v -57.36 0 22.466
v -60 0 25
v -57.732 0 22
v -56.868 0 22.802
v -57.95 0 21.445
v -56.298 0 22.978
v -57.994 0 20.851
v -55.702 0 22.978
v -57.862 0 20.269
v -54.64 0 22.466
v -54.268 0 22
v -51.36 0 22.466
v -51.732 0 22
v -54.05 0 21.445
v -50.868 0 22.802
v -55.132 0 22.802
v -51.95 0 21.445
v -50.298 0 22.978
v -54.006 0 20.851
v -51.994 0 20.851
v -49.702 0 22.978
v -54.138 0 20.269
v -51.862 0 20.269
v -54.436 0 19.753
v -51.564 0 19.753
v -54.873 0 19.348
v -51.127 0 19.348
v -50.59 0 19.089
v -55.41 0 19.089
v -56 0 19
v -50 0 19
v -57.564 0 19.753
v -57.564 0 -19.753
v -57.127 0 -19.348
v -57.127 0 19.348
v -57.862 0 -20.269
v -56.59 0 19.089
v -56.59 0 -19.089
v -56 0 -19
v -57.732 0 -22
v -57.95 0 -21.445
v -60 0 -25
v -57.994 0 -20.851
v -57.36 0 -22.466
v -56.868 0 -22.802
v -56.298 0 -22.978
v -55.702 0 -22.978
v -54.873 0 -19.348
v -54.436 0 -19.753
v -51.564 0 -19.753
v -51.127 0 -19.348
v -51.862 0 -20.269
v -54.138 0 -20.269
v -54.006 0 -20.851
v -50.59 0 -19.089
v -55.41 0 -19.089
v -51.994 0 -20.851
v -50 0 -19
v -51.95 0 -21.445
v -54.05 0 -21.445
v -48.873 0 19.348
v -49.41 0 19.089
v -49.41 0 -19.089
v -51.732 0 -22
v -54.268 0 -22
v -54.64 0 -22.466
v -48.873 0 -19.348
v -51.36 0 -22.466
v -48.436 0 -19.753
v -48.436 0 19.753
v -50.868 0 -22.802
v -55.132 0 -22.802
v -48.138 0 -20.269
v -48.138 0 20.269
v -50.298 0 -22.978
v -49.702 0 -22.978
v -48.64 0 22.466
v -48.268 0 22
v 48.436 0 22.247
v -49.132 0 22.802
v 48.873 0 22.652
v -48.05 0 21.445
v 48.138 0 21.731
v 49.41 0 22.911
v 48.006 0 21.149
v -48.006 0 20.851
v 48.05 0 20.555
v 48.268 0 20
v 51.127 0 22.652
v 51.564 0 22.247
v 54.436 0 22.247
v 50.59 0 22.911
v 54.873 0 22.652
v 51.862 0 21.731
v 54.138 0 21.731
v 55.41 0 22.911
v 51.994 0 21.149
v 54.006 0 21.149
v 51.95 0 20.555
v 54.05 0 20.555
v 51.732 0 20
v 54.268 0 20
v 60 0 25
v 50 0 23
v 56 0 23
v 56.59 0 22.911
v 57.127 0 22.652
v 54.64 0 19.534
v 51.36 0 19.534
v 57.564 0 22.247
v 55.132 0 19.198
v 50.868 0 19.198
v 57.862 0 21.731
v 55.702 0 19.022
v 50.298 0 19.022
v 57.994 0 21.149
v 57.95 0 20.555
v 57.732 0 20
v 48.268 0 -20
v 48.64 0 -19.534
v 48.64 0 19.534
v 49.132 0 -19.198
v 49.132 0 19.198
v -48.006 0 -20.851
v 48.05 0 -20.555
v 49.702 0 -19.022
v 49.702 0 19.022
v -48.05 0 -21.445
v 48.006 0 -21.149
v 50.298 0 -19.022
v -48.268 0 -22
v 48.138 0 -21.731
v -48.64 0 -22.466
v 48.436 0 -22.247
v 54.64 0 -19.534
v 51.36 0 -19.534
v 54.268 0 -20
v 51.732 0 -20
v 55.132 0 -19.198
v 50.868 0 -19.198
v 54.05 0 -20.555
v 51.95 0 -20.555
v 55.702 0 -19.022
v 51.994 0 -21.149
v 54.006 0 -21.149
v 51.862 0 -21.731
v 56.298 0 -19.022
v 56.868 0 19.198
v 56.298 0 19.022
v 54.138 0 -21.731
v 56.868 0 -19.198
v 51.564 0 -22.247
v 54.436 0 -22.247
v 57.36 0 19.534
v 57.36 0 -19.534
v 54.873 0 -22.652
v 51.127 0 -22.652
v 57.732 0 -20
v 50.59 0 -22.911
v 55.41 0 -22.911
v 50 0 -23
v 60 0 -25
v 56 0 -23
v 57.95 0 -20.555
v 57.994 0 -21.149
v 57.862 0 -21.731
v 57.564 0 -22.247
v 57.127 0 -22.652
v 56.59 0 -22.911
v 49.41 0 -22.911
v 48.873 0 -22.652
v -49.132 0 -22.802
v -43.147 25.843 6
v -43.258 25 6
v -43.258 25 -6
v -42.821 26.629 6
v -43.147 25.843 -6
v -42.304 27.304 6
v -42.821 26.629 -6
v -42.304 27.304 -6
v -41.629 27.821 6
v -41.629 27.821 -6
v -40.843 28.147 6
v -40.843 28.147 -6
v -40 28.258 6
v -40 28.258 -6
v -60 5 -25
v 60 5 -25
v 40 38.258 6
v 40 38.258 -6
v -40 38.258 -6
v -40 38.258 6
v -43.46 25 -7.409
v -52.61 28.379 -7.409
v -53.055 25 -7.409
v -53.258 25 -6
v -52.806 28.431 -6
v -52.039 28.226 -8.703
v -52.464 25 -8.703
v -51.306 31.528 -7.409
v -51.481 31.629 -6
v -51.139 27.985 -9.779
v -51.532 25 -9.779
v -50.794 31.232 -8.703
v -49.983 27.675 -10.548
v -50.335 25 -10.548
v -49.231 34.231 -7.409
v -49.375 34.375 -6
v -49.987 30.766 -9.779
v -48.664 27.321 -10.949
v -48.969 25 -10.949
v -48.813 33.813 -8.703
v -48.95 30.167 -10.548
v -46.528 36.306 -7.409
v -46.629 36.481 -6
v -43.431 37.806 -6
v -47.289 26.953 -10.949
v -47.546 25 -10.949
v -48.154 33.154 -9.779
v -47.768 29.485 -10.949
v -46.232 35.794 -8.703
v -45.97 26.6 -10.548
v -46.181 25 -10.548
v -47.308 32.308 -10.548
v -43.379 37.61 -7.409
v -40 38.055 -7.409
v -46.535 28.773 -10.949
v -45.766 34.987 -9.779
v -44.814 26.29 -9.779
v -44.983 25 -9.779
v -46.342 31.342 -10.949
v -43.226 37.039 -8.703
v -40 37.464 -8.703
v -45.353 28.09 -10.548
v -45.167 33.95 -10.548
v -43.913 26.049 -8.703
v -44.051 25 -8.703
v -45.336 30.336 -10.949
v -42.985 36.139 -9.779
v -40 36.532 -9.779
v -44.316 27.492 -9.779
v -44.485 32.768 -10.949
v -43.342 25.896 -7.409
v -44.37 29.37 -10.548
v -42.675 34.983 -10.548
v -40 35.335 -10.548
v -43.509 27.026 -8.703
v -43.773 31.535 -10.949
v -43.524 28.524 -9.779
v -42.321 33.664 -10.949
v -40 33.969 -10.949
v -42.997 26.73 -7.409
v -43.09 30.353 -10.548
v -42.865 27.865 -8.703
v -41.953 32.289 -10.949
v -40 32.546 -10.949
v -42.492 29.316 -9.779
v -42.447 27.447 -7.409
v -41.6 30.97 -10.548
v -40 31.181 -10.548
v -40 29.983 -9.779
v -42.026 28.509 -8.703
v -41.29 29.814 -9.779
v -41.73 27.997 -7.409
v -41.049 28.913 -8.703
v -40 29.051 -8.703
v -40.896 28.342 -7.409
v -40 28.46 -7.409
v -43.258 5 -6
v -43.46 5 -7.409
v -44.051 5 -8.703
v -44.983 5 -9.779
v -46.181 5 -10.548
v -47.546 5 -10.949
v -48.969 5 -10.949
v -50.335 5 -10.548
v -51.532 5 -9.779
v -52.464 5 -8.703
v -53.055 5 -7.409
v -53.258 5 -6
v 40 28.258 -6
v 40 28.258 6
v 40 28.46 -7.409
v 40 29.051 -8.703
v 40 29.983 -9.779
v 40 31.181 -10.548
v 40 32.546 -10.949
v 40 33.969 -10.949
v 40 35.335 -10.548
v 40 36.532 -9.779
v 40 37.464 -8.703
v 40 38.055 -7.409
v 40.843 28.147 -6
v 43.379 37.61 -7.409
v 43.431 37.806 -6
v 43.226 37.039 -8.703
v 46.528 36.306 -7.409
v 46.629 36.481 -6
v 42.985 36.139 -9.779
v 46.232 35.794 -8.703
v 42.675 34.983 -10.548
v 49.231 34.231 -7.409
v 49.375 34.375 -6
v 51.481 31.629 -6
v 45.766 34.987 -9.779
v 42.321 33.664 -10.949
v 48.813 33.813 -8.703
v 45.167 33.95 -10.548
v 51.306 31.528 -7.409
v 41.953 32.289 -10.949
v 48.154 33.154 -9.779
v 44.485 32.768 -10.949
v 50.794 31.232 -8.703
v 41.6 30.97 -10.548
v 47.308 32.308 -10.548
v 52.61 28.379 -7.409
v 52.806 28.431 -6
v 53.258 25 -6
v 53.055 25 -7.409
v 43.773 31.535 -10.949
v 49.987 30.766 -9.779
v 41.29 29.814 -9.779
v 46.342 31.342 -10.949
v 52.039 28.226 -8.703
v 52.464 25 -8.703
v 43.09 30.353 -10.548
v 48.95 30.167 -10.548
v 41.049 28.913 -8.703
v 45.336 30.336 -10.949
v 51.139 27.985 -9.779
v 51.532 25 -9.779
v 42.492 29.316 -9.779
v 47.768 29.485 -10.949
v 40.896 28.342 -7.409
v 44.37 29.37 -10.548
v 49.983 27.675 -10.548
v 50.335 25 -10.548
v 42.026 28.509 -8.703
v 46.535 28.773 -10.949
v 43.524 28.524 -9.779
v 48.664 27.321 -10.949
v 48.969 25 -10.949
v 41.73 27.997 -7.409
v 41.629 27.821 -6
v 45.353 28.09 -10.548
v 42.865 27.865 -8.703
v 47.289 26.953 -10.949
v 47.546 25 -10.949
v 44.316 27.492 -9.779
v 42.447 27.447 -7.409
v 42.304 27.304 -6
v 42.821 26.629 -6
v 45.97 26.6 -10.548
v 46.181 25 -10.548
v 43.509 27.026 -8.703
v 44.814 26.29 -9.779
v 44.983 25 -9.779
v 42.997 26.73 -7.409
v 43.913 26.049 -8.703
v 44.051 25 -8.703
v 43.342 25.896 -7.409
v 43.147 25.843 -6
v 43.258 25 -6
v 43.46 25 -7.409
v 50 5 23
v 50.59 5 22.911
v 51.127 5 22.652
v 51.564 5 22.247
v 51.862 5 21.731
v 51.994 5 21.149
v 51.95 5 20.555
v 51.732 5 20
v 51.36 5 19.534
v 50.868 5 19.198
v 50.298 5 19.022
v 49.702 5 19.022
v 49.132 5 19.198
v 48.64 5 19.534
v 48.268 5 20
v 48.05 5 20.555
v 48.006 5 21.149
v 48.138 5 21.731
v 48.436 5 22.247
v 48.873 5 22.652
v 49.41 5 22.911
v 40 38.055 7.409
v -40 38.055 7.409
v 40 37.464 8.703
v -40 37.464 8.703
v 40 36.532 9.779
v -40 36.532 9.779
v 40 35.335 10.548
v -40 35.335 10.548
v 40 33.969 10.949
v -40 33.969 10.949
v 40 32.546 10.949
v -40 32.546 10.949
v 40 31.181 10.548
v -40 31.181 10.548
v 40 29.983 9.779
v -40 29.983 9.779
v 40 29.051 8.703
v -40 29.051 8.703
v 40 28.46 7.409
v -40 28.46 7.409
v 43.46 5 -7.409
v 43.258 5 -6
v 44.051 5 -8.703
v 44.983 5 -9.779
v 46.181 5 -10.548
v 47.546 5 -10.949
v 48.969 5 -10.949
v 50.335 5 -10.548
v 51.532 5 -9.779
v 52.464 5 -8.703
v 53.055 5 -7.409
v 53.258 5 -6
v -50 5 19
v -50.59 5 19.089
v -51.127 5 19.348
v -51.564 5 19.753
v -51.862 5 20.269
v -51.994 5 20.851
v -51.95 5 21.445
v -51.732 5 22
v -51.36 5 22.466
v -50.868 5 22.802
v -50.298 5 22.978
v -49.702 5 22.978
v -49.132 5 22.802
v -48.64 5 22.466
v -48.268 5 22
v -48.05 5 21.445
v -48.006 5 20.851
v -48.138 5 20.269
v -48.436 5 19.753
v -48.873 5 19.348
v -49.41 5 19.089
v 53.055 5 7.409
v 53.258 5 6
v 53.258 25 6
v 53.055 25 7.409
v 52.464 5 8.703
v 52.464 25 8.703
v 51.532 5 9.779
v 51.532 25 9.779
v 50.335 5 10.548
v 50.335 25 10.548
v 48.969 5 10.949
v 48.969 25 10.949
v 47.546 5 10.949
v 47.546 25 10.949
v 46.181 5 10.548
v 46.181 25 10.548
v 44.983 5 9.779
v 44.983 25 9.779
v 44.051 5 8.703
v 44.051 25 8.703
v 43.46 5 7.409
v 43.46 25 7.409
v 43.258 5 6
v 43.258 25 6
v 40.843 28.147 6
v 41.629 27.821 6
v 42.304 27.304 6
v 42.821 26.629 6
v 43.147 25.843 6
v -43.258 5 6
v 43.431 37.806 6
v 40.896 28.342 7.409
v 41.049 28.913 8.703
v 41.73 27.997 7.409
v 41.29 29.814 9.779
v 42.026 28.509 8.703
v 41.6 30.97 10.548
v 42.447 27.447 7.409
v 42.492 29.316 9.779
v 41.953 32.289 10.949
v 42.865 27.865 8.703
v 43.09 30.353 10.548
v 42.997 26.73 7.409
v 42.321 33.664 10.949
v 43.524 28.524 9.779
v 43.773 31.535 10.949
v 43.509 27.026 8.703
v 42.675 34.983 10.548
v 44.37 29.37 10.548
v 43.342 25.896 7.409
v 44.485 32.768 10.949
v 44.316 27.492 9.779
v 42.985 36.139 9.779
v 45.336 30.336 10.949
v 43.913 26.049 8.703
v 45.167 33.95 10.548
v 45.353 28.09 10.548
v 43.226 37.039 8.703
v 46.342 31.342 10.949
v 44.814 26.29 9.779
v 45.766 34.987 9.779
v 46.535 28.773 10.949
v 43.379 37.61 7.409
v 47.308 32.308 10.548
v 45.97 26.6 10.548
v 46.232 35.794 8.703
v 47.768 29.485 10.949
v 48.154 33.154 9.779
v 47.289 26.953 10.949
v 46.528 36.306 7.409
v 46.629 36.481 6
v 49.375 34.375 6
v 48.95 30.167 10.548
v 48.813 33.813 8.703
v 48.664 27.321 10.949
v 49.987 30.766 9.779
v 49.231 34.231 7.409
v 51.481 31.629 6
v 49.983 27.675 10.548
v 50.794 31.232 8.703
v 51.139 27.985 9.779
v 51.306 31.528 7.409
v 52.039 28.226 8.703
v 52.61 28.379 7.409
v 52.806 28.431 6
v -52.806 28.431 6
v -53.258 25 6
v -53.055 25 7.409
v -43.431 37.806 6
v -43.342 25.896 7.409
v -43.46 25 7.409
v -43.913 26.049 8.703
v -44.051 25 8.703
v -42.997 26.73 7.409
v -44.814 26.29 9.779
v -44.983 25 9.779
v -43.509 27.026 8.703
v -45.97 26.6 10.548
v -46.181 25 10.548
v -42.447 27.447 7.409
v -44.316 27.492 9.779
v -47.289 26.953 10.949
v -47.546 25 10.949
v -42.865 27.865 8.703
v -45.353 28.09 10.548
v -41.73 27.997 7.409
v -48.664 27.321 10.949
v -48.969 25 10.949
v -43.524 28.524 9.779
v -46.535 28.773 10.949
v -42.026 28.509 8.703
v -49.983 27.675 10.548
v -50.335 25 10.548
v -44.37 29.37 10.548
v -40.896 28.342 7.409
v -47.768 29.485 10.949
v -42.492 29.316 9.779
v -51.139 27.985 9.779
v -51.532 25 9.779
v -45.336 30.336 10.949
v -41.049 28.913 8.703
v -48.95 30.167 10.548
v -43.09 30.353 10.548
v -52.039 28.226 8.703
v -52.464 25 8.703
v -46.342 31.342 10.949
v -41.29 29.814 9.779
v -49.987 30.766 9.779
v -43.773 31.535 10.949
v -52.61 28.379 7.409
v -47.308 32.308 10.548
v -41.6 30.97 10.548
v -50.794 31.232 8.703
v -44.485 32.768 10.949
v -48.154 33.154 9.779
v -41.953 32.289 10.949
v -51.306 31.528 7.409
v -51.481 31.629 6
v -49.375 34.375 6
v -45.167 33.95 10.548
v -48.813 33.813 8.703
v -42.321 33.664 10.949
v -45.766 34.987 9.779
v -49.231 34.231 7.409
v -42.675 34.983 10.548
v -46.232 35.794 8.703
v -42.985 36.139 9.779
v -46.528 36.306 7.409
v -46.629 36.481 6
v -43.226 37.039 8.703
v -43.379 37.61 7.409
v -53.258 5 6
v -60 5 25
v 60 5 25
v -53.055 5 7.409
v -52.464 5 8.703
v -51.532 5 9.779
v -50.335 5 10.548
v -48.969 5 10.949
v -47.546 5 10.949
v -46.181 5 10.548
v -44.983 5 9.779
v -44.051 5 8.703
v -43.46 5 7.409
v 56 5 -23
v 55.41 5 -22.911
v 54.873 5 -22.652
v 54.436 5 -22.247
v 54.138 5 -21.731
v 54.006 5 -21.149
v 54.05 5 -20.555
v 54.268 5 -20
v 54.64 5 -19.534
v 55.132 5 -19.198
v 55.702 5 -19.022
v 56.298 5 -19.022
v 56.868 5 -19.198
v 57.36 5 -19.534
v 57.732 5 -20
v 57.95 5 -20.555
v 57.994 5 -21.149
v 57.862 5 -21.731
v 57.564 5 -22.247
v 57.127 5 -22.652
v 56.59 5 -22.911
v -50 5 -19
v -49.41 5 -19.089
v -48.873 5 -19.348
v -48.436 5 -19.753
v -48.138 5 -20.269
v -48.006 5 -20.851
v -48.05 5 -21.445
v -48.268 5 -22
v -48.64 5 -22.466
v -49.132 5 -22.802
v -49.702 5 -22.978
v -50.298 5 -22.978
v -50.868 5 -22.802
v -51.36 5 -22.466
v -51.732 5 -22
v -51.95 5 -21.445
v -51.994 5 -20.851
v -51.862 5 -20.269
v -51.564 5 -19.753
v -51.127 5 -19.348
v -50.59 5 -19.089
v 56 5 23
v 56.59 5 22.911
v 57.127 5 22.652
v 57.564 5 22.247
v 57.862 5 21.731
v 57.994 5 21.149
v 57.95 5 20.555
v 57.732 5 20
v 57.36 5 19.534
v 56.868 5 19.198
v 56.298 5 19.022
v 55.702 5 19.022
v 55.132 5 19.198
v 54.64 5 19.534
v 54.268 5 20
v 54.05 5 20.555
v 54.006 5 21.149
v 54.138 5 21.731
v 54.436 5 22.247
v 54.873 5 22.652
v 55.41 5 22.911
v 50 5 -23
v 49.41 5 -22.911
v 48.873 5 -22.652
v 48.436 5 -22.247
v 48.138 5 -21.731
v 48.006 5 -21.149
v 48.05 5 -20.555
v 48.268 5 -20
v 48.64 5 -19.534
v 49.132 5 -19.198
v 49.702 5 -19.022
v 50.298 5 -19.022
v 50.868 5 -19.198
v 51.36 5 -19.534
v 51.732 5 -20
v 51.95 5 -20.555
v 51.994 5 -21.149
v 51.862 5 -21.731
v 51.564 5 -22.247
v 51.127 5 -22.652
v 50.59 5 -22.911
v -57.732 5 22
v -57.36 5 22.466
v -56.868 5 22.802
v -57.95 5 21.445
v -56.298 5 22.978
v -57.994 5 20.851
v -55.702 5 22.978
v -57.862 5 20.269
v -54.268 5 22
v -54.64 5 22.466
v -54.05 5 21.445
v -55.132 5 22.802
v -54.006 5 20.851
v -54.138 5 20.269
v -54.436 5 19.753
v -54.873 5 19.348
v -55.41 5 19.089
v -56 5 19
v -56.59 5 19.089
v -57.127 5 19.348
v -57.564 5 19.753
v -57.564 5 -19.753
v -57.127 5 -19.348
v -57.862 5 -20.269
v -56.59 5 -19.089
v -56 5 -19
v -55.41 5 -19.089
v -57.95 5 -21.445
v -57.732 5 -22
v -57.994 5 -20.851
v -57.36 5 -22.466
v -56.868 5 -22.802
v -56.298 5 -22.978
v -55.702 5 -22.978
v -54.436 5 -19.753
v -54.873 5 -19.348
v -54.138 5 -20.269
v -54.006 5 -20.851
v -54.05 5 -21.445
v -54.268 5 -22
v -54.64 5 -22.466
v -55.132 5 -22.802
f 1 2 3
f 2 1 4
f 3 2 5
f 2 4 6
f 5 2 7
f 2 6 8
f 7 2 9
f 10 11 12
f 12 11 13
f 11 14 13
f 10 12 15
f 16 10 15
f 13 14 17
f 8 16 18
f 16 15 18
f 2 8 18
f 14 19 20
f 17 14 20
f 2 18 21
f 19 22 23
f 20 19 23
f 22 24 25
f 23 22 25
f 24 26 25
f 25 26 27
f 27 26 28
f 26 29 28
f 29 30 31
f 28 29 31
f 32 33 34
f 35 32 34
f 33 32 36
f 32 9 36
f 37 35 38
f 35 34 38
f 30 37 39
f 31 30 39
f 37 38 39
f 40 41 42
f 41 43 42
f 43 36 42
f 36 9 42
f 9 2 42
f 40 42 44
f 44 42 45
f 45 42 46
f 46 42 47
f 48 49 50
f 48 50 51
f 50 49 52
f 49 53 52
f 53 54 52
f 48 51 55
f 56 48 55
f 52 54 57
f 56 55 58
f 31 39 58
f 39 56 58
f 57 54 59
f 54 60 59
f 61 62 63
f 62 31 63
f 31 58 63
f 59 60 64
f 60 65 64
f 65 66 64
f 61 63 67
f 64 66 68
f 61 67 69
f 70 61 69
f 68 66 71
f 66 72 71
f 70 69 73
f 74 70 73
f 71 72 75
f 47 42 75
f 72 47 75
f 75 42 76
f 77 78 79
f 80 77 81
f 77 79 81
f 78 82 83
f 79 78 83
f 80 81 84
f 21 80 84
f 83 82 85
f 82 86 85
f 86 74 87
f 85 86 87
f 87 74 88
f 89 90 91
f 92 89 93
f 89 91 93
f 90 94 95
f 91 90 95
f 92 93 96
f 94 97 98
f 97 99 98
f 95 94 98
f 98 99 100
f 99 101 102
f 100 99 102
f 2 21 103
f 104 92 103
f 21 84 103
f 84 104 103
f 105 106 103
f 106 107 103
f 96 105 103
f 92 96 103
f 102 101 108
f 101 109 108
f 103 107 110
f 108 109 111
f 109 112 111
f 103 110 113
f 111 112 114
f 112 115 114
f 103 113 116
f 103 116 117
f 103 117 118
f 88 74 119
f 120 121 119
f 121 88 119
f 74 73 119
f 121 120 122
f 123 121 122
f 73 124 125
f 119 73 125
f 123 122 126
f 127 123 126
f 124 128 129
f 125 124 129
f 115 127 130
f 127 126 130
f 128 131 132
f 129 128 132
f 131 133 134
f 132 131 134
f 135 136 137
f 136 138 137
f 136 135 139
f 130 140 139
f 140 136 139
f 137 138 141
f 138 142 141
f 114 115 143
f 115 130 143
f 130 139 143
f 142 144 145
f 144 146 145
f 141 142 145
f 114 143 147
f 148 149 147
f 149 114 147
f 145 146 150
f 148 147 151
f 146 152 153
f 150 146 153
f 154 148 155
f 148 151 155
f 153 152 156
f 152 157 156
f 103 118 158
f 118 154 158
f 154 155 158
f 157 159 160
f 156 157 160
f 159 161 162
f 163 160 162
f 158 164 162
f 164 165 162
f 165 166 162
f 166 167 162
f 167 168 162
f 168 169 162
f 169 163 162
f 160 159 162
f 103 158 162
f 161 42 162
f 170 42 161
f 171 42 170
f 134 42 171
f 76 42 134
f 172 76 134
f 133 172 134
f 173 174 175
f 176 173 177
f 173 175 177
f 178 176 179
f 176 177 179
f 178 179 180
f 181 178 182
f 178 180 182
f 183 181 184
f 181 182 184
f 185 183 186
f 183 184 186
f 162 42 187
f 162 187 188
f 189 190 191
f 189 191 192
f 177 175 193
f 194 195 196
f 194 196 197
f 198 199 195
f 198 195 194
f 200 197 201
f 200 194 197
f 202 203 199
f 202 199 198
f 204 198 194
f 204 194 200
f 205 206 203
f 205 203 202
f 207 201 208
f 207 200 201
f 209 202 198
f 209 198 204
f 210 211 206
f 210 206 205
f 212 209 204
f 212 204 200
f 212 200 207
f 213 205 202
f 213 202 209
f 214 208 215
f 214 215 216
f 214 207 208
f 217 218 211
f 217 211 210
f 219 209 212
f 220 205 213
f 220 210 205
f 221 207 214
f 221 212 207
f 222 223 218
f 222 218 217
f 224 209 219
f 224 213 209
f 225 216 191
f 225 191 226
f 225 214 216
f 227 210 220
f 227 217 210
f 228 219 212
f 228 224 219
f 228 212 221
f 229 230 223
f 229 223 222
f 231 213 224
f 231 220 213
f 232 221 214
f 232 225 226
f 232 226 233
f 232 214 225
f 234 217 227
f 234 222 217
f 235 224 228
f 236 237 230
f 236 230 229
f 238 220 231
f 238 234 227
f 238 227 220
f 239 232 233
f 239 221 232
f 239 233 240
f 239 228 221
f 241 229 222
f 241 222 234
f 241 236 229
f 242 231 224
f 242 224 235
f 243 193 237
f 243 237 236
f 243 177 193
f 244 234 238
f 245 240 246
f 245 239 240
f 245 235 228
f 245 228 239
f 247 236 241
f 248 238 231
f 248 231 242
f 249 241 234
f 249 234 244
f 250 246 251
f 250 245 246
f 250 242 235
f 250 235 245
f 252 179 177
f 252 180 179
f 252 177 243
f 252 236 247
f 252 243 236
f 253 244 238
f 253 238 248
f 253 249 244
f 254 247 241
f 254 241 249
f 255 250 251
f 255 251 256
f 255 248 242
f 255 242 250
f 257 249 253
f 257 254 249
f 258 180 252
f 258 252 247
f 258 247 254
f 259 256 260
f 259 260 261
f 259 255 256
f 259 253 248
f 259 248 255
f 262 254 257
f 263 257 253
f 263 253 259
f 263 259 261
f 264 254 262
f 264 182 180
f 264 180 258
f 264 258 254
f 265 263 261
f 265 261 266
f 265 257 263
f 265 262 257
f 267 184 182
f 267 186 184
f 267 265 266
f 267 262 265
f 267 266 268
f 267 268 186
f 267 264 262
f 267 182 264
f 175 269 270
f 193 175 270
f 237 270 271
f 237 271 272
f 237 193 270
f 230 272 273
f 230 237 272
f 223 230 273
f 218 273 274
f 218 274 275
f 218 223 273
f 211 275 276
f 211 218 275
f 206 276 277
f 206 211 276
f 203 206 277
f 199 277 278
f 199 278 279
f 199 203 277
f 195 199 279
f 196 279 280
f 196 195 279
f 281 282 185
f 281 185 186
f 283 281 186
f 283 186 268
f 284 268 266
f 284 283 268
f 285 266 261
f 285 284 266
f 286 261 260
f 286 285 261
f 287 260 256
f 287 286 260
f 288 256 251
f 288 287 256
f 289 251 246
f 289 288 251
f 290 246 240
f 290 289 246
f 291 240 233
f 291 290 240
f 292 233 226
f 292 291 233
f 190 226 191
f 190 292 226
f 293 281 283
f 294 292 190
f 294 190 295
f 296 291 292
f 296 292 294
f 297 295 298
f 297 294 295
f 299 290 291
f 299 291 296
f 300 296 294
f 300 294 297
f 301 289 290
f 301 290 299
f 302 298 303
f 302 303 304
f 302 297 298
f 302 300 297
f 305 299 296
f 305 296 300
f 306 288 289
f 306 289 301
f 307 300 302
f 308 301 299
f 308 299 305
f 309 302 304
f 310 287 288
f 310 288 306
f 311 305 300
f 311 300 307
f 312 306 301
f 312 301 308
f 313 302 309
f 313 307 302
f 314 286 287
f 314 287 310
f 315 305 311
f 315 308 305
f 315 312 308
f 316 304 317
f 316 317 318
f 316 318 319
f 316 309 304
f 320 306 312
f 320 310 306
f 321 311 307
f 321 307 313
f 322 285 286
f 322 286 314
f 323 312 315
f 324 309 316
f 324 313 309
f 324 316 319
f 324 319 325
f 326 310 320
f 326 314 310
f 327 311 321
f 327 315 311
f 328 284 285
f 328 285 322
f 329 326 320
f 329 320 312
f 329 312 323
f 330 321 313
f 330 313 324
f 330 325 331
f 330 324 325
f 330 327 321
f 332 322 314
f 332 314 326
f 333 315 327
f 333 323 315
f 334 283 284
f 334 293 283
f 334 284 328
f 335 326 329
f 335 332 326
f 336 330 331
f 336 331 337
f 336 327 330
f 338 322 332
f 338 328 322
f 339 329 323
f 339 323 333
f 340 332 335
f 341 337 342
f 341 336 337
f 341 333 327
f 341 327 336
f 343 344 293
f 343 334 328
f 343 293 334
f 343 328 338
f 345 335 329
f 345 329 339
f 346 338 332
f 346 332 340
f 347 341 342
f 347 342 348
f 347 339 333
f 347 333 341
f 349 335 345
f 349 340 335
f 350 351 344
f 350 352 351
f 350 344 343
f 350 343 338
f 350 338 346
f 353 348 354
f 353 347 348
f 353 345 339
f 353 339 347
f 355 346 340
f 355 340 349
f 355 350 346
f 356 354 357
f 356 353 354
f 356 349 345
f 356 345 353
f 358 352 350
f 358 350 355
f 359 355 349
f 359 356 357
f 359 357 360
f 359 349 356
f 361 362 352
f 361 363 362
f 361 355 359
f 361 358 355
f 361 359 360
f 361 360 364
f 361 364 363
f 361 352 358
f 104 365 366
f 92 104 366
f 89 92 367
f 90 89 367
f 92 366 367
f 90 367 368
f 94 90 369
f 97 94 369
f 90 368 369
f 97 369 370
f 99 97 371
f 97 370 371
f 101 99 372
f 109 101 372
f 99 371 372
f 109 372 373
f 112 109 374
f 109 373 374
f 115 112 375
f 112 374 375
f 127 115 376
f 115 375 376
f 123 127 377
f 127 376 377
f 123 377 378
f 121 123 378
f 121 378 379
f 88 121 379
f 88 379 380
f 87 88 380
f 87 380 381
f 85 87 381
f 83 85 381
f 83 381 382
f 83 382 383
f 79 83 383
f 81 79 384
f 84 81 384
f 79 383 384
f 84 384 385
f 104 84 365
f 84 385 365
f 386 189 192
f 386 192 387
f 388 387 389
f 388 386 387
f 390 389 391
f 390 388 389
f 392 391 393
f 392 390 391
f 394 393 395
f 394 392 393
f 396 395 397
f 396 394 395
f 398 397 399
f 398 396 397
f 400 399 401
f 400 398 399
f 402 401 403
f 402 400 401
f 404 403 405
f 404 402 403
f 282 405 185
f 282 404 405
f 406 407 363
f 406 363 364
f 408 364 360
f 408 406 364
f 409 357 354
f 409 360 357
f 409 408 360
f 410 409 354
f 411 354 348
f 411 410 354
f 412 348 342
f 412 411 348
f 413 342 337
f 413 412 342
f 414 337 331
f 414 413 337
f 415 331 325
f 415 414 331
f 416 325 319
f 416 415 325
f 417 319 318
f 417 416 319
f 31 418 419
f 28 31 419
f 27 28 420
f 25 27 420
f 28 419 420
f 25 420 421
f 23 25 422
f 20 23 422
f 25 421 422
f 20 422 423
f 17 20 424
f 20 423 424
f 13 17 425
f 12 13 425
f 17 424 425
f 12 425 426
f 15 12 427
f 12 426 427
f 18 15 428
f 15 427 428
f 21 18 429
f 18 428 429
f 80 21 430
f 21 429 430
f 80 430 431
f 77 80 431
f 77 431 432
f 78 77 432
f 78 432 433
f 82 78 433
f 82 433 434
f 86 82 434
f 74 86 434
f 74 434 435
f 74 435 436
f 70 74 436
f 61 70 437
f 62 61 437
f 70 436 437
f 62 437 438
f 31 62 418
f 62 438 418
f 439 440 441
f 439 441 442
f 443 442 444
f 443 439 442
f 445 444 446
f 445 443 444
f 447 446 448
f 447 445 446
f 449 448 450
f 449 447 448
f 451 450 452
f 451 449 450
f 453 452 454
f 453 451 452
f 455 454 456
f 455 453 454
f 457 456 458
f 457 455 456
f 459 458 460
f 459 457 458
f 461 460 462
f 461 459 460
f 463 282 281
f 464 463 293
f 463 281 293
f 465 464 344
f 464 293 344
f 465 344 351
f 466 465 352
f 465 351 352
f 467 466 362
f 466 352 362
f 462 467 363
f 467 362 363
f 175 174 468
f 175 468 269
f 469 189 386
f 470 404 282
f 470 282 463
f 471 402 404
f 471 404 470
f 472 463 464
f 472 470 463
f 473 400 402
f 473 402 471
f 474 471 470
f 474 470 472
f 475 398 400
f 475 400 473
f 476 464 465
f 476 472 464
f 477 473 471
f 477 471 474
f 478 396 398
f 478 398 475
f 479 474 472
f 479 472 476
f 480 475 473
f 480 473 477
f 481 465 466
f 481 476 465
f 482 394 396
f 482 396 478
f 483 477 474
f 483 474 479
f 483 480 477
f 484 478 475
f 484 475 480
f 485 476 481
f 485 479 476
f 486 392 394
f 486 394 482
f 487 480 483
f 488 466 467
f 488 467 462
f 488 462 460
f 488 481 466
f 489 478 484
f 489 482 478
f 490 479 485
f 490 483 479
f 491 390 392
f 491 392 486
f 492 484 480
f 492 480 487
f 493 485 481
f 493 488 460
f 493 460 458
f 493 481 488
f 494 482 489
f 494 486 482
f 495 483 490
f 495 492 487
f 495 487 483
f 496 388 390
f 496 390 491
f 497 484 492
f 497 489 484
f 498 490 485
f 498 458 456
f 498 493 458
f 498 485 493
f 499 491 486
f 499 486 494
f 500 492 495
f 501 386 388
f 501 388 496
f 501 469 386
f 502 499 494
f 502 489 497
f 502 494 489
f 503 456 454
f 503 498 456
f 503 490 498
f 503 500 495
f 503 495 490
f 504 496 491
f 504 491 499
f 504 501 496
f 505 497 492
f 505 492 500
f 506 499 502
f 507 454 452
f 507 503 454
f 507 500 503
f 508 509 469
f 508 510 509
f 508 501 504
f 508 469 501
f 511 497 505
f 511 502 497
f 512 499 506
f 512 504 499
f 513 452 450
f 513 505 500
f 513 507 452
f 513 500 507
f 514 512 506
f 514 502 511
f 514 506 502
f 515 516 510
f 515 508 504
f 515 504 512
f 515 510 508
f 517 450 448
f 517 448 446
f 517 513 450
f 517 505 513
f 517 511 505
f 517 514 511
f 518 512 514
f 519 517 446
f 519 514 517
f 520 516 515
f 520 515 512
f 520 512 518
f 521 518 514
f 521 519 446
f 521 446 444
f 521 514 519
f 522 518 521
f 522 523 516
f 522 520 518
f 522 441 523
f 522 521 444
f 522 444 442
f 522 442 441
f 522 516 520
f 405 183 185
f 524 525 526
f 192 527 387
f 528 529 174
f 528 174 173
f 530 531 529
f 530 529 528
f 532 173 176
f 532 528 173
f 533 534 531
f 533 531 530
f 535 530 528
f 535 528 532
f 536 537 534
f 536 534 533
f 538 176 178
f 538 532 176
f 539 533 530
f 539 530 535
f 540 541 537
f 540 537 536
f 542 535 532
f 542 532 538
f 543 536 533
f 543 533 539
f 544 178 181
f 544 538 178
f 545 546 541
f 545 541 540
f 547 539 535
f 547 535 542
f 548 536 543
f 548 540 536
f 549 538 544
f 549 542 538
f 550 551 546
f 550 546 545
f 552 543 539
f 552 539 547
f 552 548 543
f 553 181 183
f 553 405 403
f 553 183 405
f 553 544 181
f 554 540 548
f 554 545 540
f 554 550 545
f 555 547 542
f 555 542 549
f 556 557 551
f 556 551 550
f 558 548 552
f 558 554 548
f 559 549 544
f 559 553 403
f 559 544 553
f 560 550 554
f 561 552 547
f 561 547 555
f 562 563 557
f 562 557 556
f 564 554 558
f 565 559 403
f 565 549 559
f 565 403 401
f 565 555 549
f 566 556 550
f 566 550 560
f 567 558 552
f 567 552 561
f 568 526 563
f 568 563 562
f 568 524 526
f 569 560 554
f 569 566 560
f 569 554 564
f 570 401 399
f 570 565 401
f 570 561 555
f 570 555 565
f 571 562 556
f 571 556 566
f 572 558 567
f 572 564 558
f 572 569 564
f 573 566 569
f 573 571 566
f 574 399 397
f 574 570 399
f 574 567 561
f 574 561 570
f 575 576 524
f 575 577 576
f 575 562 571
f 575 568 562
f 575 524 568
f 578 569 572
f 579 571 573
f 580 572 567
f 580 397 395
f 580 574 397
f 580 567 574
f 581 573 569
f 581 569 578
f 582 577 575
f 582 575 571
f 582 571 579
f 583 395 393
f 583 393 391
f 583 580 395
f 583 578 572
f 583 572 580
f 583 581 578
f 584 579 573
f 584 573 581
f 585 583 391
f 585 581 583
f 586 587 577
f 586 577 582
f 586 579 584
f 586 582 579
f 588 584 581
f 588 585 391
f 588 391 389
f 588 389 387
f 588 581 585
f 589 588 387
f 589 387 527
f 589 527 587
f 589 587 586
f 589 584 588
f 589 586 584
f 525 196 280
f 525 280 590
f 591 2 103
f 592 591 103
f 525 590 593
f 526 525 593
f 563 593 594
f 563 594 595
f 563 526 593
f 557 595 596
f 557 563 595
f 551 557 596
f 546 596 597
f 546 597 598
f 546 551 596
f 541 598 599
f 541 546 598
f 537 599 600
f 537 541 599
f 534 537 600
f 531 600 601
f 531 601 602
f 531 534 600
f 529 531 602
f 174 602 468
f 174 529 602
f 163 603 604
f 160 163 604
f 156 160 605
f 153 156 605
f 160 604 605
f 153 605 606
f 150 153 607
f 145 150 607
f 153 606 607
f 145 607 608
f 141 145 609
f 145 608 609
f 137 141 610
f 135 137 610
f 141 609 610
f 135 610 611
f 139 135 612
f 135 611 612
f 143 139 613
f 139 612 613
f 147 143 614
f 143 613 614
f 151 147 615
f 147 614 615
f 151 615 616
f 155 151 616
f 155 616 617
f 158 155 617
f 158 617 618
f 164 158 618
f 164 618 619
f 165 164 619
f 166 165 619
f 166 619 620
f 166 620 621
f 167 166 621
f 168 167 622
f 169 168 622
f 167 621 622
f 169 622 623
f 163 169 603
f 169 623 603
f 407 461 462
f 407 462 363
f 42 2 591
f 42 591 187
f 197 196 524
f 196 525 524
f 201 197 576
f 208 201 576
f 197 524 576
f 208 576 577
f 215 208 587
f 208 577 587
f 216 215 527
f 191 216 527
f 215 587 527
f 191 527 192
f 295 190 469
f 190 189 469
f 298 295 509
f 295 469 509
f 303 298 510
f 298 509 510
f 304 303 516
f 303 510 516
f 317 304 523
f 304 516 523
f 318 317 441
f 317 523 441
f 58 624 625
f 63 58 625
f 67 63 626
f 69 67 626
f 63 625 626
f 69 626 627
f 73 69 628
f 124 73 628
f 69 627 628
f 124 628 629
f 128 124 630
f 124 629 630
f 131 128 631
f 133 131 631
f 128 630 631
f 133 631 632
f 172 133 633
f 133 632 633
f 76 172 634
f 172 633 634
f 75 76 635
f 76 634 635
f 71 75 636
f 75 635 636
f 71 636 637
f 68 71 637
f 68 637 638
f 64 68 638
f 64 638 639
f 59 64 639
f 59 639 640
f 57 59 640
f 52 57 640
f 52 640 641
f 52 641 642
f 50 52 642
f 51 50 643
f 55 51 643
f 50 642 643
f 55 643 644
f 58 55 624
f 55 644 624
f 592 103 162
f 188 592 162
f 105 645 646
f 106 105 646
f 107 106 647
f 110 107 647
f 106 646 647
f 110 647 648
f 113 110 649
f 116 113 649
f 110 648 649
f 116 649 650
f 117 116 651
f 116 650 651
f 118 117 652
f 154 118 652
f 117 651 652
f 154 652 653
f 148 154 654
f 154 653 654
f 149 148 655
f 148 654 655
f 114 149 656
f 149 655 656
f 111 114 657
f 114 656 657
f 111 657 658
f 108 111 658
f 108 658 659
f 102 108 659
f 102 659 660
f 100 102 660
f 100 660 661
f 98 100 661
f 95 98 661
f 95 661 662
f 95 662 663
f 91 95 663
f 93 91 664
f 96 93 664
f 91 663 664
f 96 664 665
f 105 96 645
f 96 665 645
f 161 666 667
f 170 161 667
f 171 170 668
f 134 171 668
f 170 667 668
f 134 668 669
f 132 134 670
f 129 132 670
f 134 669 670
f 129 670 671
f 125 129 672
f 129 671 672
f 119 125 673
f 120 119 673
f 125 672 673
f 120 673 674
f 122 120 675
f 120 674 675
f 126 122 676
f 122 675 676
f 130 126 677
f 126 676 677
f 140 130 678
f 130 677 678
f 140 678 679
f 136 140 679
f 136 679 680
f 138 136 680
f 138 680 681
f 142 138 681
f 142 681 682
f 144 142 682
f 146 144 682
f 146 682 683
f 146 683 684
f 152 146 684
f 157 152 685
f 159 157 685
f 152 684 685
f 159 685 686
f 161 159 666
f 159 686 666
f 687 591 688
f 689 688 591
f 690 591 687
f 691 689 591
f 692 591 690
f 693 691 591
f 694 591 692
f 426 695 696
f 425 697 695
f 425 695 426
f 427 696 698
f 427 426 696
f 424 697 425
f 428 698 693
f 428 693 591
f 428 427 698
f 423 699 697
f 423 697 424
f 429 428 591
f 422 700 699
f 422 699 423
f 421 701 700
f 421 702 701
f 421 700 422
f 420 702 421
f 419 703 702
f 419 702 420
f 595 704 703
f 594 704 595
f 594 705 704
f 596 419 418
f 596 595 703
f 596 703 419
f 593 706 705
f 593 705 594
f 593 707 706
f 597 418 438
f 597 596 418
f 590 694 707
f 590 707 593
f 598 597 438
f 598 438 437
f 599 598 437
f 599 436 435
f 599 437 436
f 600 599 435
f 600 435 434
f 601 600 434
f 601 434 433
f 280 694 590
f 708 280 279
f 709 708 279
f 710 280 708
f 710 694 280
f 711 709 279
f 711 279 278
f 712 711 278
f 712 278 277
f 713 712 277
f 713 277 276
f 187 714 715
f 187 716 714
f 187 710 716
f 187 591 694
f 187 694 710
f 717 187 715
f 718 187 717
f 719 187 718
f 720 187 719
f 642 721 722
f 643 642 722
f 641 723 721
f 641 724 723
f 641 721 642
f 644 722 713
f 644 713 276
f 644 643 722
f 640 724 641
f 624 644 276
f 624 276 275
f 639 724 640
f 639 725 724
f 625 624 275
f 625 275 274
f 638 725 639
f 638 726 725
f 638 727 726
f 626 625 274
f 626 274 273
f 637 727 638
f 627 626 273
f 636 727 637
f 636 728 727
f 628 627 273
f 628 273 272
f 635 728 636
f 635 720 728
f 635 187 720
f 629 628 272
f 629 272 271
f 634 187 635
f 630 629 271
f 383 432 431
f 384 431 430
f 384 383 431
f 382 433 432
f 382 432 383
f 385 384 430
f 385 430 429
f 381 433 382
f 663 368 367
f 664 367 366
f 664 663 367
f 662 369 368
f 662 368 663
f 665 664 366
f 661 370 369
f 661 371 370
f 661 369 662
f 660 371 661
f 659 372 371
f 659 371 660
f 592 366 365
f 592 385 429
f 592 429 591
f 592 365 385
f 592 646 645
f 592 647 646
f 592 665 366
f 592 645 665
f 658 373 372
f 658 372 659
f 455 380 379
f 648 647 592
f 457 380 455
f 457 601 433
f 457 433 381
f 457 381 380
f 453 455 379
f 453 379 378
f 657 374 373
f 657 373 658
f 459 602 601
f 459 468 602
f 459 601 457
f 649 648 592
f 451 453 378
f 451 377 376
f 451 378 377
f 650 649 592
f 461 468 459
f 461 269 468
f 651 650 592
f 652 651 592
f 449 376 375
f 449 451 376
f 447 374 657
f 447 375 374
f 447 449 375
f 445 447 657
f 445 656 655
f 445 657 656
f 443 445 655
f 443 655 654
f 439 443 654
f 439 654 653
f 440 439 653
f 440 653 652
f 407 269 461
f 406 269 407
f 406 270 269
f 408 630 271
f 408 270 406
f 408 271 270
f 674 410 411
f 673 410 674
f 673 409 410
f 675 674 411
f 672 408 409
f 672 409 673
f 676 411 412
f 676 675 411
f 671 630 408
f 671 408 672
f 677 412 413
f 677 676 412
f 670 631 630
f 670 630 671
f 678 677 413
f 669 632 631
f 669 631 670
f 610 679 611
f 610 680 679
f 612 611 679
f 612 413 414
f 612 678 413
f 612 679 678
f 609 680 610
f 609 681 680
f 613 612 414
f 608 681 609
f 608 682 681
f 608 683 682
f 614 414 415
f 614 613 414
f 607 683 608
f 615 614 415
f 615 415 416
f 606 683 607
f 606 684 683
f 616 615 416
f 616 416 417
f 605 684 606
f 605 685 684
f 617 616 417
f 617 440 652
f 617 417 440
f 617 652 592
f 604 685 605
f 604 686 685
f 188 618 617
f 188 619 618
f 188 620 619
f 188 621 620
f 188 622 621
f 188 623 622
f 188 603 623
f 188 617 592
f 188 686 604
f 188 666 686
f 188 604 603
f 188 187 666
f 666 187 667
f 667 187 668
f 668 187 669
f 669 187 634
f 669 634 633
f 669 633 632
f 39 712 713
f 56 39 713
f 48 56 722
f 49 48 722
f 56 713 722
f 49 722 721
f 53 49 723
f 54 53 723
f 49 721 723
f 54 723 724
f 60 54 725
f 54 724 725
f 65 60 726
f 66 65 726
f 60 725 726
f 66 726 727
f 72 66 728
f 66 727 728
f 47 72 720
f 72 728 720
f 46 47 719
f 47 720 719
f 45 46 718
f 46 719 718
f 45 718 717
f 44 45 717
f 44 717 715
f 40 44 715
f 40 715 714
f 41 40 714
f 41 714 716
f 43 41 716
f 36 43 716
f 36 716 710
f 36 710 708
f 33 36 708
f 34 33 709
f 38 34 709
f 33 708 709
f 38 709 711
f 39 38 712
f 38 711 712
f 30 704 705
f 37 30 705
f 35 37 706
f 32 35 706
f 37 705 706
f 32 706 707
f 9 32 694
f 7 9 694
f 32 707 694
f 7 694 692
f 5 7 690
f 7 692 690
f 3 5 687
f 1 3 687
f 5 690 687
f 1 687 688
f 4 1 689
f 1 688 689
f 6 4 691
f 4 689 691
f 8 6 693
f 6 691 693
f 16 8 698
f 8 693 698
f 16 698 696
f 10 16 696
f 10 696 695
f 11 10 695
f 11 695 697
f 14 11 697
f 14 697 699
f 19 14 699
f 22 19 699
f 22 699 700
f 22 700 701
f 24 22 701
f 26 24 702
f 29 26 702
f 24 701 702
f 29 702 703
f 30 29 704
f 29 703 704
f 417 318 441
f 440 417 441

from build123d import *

# Parameters (mm, degrees)
SKETCH3_W           = 120
SKETCH3_H           = 50
BOSS_EXTRUDE1_DEPTH = 5
SKETCH6_R           = 2
CUT_EXTRUDE1_DEPTH  = 5


with BuildPart() as part:
    # Sketch3 → Boss-Extrude1 (new body)
    with BuildSketch(Plane(origin=(0, 0, 0), x_dir=(1, 0, 0), z_dir=(0, 1, 0))):
        Rectangle(SKETCH3_W, SKETCH3_H)
    extrude(amount=BOSS_EXTRUDE1_DEPTH)

    # Sweep1: sweep along a path in Sketch4
    with BuildLine(Plane.XY) as sweep1_path:
        Line((-50, 5), (-50, 25))
        ThreePointArc((-50, 25), (-47.071067812, 32.071067812), (-40, 35))
        Line((-40, 35), (40, 35))
        ThreePointArc((40, 35), (47.071067812, 32.071067812), (50, 25))
        Line((50, 25), (50, 5))
    # Sketch5 → Sweep1 (sweep)
    with BuildSketch(Plane(origin=(0, 5, 0), x_dir=(1, 0, 0), z_dir=(0, 1, 0))):
        with BuildLine():
            Line((-43.257688432, 6), (-43.257688432, -6))
            ThreePointArc((-43.257688432, -6), (-48.257688432, -11), (-53.257688432, -6))
            Line((-53.257688432, -6), (-53.257688432, 6))
            ThreePointArc((-53.257688432, 6), (-48.257688432, 11), (-43.257688432, 6))
        make_face()
    sweep(path=sweep1_path.line)

    # Sketch6 → Cut-Extrude1 (cut)
    with BuildSketch(Plane(origin=(0, 5, 0), x_dir=(1, 0, 0), z_dir=(0, 1, 0))):
        with Locations(Location((-56, 21, 0), (0, 0, 270))):
            Circle(SKETCH6_R)
        with Locations(Location((-50, 21, 0), (0, 0, 270))):
            Circle(SKETCH6_R)
        with Locations(Location((-50, -21, 0), (0, 0, 90))):
            Circle(SKETCH6_R)
        with Locations(Location((-56, -21, 0), (0, 0, 90))):
            Circle(SKETCH6_R)
        with Locations(Location((56, -21, 0), (0, 0, 270))):
            Circle(SKETCH6_R)
        with Locations(Location((50, -21, 0), (0, 0, 270))):
            Circle(SKETCH6_R)
        with Locations(Location((50, 21, 0), (0, 0, 90))):
            Circle(SKETCH6_R)
        with Locations(Location((56, 21, 0), (0, 0, 90))):
            Circle(SKETCH6_R)
    extrude(amount=-CUT_EXTRUDE1_DEPTH, mode=Mode.SUBTRACT)


solid = part.part
